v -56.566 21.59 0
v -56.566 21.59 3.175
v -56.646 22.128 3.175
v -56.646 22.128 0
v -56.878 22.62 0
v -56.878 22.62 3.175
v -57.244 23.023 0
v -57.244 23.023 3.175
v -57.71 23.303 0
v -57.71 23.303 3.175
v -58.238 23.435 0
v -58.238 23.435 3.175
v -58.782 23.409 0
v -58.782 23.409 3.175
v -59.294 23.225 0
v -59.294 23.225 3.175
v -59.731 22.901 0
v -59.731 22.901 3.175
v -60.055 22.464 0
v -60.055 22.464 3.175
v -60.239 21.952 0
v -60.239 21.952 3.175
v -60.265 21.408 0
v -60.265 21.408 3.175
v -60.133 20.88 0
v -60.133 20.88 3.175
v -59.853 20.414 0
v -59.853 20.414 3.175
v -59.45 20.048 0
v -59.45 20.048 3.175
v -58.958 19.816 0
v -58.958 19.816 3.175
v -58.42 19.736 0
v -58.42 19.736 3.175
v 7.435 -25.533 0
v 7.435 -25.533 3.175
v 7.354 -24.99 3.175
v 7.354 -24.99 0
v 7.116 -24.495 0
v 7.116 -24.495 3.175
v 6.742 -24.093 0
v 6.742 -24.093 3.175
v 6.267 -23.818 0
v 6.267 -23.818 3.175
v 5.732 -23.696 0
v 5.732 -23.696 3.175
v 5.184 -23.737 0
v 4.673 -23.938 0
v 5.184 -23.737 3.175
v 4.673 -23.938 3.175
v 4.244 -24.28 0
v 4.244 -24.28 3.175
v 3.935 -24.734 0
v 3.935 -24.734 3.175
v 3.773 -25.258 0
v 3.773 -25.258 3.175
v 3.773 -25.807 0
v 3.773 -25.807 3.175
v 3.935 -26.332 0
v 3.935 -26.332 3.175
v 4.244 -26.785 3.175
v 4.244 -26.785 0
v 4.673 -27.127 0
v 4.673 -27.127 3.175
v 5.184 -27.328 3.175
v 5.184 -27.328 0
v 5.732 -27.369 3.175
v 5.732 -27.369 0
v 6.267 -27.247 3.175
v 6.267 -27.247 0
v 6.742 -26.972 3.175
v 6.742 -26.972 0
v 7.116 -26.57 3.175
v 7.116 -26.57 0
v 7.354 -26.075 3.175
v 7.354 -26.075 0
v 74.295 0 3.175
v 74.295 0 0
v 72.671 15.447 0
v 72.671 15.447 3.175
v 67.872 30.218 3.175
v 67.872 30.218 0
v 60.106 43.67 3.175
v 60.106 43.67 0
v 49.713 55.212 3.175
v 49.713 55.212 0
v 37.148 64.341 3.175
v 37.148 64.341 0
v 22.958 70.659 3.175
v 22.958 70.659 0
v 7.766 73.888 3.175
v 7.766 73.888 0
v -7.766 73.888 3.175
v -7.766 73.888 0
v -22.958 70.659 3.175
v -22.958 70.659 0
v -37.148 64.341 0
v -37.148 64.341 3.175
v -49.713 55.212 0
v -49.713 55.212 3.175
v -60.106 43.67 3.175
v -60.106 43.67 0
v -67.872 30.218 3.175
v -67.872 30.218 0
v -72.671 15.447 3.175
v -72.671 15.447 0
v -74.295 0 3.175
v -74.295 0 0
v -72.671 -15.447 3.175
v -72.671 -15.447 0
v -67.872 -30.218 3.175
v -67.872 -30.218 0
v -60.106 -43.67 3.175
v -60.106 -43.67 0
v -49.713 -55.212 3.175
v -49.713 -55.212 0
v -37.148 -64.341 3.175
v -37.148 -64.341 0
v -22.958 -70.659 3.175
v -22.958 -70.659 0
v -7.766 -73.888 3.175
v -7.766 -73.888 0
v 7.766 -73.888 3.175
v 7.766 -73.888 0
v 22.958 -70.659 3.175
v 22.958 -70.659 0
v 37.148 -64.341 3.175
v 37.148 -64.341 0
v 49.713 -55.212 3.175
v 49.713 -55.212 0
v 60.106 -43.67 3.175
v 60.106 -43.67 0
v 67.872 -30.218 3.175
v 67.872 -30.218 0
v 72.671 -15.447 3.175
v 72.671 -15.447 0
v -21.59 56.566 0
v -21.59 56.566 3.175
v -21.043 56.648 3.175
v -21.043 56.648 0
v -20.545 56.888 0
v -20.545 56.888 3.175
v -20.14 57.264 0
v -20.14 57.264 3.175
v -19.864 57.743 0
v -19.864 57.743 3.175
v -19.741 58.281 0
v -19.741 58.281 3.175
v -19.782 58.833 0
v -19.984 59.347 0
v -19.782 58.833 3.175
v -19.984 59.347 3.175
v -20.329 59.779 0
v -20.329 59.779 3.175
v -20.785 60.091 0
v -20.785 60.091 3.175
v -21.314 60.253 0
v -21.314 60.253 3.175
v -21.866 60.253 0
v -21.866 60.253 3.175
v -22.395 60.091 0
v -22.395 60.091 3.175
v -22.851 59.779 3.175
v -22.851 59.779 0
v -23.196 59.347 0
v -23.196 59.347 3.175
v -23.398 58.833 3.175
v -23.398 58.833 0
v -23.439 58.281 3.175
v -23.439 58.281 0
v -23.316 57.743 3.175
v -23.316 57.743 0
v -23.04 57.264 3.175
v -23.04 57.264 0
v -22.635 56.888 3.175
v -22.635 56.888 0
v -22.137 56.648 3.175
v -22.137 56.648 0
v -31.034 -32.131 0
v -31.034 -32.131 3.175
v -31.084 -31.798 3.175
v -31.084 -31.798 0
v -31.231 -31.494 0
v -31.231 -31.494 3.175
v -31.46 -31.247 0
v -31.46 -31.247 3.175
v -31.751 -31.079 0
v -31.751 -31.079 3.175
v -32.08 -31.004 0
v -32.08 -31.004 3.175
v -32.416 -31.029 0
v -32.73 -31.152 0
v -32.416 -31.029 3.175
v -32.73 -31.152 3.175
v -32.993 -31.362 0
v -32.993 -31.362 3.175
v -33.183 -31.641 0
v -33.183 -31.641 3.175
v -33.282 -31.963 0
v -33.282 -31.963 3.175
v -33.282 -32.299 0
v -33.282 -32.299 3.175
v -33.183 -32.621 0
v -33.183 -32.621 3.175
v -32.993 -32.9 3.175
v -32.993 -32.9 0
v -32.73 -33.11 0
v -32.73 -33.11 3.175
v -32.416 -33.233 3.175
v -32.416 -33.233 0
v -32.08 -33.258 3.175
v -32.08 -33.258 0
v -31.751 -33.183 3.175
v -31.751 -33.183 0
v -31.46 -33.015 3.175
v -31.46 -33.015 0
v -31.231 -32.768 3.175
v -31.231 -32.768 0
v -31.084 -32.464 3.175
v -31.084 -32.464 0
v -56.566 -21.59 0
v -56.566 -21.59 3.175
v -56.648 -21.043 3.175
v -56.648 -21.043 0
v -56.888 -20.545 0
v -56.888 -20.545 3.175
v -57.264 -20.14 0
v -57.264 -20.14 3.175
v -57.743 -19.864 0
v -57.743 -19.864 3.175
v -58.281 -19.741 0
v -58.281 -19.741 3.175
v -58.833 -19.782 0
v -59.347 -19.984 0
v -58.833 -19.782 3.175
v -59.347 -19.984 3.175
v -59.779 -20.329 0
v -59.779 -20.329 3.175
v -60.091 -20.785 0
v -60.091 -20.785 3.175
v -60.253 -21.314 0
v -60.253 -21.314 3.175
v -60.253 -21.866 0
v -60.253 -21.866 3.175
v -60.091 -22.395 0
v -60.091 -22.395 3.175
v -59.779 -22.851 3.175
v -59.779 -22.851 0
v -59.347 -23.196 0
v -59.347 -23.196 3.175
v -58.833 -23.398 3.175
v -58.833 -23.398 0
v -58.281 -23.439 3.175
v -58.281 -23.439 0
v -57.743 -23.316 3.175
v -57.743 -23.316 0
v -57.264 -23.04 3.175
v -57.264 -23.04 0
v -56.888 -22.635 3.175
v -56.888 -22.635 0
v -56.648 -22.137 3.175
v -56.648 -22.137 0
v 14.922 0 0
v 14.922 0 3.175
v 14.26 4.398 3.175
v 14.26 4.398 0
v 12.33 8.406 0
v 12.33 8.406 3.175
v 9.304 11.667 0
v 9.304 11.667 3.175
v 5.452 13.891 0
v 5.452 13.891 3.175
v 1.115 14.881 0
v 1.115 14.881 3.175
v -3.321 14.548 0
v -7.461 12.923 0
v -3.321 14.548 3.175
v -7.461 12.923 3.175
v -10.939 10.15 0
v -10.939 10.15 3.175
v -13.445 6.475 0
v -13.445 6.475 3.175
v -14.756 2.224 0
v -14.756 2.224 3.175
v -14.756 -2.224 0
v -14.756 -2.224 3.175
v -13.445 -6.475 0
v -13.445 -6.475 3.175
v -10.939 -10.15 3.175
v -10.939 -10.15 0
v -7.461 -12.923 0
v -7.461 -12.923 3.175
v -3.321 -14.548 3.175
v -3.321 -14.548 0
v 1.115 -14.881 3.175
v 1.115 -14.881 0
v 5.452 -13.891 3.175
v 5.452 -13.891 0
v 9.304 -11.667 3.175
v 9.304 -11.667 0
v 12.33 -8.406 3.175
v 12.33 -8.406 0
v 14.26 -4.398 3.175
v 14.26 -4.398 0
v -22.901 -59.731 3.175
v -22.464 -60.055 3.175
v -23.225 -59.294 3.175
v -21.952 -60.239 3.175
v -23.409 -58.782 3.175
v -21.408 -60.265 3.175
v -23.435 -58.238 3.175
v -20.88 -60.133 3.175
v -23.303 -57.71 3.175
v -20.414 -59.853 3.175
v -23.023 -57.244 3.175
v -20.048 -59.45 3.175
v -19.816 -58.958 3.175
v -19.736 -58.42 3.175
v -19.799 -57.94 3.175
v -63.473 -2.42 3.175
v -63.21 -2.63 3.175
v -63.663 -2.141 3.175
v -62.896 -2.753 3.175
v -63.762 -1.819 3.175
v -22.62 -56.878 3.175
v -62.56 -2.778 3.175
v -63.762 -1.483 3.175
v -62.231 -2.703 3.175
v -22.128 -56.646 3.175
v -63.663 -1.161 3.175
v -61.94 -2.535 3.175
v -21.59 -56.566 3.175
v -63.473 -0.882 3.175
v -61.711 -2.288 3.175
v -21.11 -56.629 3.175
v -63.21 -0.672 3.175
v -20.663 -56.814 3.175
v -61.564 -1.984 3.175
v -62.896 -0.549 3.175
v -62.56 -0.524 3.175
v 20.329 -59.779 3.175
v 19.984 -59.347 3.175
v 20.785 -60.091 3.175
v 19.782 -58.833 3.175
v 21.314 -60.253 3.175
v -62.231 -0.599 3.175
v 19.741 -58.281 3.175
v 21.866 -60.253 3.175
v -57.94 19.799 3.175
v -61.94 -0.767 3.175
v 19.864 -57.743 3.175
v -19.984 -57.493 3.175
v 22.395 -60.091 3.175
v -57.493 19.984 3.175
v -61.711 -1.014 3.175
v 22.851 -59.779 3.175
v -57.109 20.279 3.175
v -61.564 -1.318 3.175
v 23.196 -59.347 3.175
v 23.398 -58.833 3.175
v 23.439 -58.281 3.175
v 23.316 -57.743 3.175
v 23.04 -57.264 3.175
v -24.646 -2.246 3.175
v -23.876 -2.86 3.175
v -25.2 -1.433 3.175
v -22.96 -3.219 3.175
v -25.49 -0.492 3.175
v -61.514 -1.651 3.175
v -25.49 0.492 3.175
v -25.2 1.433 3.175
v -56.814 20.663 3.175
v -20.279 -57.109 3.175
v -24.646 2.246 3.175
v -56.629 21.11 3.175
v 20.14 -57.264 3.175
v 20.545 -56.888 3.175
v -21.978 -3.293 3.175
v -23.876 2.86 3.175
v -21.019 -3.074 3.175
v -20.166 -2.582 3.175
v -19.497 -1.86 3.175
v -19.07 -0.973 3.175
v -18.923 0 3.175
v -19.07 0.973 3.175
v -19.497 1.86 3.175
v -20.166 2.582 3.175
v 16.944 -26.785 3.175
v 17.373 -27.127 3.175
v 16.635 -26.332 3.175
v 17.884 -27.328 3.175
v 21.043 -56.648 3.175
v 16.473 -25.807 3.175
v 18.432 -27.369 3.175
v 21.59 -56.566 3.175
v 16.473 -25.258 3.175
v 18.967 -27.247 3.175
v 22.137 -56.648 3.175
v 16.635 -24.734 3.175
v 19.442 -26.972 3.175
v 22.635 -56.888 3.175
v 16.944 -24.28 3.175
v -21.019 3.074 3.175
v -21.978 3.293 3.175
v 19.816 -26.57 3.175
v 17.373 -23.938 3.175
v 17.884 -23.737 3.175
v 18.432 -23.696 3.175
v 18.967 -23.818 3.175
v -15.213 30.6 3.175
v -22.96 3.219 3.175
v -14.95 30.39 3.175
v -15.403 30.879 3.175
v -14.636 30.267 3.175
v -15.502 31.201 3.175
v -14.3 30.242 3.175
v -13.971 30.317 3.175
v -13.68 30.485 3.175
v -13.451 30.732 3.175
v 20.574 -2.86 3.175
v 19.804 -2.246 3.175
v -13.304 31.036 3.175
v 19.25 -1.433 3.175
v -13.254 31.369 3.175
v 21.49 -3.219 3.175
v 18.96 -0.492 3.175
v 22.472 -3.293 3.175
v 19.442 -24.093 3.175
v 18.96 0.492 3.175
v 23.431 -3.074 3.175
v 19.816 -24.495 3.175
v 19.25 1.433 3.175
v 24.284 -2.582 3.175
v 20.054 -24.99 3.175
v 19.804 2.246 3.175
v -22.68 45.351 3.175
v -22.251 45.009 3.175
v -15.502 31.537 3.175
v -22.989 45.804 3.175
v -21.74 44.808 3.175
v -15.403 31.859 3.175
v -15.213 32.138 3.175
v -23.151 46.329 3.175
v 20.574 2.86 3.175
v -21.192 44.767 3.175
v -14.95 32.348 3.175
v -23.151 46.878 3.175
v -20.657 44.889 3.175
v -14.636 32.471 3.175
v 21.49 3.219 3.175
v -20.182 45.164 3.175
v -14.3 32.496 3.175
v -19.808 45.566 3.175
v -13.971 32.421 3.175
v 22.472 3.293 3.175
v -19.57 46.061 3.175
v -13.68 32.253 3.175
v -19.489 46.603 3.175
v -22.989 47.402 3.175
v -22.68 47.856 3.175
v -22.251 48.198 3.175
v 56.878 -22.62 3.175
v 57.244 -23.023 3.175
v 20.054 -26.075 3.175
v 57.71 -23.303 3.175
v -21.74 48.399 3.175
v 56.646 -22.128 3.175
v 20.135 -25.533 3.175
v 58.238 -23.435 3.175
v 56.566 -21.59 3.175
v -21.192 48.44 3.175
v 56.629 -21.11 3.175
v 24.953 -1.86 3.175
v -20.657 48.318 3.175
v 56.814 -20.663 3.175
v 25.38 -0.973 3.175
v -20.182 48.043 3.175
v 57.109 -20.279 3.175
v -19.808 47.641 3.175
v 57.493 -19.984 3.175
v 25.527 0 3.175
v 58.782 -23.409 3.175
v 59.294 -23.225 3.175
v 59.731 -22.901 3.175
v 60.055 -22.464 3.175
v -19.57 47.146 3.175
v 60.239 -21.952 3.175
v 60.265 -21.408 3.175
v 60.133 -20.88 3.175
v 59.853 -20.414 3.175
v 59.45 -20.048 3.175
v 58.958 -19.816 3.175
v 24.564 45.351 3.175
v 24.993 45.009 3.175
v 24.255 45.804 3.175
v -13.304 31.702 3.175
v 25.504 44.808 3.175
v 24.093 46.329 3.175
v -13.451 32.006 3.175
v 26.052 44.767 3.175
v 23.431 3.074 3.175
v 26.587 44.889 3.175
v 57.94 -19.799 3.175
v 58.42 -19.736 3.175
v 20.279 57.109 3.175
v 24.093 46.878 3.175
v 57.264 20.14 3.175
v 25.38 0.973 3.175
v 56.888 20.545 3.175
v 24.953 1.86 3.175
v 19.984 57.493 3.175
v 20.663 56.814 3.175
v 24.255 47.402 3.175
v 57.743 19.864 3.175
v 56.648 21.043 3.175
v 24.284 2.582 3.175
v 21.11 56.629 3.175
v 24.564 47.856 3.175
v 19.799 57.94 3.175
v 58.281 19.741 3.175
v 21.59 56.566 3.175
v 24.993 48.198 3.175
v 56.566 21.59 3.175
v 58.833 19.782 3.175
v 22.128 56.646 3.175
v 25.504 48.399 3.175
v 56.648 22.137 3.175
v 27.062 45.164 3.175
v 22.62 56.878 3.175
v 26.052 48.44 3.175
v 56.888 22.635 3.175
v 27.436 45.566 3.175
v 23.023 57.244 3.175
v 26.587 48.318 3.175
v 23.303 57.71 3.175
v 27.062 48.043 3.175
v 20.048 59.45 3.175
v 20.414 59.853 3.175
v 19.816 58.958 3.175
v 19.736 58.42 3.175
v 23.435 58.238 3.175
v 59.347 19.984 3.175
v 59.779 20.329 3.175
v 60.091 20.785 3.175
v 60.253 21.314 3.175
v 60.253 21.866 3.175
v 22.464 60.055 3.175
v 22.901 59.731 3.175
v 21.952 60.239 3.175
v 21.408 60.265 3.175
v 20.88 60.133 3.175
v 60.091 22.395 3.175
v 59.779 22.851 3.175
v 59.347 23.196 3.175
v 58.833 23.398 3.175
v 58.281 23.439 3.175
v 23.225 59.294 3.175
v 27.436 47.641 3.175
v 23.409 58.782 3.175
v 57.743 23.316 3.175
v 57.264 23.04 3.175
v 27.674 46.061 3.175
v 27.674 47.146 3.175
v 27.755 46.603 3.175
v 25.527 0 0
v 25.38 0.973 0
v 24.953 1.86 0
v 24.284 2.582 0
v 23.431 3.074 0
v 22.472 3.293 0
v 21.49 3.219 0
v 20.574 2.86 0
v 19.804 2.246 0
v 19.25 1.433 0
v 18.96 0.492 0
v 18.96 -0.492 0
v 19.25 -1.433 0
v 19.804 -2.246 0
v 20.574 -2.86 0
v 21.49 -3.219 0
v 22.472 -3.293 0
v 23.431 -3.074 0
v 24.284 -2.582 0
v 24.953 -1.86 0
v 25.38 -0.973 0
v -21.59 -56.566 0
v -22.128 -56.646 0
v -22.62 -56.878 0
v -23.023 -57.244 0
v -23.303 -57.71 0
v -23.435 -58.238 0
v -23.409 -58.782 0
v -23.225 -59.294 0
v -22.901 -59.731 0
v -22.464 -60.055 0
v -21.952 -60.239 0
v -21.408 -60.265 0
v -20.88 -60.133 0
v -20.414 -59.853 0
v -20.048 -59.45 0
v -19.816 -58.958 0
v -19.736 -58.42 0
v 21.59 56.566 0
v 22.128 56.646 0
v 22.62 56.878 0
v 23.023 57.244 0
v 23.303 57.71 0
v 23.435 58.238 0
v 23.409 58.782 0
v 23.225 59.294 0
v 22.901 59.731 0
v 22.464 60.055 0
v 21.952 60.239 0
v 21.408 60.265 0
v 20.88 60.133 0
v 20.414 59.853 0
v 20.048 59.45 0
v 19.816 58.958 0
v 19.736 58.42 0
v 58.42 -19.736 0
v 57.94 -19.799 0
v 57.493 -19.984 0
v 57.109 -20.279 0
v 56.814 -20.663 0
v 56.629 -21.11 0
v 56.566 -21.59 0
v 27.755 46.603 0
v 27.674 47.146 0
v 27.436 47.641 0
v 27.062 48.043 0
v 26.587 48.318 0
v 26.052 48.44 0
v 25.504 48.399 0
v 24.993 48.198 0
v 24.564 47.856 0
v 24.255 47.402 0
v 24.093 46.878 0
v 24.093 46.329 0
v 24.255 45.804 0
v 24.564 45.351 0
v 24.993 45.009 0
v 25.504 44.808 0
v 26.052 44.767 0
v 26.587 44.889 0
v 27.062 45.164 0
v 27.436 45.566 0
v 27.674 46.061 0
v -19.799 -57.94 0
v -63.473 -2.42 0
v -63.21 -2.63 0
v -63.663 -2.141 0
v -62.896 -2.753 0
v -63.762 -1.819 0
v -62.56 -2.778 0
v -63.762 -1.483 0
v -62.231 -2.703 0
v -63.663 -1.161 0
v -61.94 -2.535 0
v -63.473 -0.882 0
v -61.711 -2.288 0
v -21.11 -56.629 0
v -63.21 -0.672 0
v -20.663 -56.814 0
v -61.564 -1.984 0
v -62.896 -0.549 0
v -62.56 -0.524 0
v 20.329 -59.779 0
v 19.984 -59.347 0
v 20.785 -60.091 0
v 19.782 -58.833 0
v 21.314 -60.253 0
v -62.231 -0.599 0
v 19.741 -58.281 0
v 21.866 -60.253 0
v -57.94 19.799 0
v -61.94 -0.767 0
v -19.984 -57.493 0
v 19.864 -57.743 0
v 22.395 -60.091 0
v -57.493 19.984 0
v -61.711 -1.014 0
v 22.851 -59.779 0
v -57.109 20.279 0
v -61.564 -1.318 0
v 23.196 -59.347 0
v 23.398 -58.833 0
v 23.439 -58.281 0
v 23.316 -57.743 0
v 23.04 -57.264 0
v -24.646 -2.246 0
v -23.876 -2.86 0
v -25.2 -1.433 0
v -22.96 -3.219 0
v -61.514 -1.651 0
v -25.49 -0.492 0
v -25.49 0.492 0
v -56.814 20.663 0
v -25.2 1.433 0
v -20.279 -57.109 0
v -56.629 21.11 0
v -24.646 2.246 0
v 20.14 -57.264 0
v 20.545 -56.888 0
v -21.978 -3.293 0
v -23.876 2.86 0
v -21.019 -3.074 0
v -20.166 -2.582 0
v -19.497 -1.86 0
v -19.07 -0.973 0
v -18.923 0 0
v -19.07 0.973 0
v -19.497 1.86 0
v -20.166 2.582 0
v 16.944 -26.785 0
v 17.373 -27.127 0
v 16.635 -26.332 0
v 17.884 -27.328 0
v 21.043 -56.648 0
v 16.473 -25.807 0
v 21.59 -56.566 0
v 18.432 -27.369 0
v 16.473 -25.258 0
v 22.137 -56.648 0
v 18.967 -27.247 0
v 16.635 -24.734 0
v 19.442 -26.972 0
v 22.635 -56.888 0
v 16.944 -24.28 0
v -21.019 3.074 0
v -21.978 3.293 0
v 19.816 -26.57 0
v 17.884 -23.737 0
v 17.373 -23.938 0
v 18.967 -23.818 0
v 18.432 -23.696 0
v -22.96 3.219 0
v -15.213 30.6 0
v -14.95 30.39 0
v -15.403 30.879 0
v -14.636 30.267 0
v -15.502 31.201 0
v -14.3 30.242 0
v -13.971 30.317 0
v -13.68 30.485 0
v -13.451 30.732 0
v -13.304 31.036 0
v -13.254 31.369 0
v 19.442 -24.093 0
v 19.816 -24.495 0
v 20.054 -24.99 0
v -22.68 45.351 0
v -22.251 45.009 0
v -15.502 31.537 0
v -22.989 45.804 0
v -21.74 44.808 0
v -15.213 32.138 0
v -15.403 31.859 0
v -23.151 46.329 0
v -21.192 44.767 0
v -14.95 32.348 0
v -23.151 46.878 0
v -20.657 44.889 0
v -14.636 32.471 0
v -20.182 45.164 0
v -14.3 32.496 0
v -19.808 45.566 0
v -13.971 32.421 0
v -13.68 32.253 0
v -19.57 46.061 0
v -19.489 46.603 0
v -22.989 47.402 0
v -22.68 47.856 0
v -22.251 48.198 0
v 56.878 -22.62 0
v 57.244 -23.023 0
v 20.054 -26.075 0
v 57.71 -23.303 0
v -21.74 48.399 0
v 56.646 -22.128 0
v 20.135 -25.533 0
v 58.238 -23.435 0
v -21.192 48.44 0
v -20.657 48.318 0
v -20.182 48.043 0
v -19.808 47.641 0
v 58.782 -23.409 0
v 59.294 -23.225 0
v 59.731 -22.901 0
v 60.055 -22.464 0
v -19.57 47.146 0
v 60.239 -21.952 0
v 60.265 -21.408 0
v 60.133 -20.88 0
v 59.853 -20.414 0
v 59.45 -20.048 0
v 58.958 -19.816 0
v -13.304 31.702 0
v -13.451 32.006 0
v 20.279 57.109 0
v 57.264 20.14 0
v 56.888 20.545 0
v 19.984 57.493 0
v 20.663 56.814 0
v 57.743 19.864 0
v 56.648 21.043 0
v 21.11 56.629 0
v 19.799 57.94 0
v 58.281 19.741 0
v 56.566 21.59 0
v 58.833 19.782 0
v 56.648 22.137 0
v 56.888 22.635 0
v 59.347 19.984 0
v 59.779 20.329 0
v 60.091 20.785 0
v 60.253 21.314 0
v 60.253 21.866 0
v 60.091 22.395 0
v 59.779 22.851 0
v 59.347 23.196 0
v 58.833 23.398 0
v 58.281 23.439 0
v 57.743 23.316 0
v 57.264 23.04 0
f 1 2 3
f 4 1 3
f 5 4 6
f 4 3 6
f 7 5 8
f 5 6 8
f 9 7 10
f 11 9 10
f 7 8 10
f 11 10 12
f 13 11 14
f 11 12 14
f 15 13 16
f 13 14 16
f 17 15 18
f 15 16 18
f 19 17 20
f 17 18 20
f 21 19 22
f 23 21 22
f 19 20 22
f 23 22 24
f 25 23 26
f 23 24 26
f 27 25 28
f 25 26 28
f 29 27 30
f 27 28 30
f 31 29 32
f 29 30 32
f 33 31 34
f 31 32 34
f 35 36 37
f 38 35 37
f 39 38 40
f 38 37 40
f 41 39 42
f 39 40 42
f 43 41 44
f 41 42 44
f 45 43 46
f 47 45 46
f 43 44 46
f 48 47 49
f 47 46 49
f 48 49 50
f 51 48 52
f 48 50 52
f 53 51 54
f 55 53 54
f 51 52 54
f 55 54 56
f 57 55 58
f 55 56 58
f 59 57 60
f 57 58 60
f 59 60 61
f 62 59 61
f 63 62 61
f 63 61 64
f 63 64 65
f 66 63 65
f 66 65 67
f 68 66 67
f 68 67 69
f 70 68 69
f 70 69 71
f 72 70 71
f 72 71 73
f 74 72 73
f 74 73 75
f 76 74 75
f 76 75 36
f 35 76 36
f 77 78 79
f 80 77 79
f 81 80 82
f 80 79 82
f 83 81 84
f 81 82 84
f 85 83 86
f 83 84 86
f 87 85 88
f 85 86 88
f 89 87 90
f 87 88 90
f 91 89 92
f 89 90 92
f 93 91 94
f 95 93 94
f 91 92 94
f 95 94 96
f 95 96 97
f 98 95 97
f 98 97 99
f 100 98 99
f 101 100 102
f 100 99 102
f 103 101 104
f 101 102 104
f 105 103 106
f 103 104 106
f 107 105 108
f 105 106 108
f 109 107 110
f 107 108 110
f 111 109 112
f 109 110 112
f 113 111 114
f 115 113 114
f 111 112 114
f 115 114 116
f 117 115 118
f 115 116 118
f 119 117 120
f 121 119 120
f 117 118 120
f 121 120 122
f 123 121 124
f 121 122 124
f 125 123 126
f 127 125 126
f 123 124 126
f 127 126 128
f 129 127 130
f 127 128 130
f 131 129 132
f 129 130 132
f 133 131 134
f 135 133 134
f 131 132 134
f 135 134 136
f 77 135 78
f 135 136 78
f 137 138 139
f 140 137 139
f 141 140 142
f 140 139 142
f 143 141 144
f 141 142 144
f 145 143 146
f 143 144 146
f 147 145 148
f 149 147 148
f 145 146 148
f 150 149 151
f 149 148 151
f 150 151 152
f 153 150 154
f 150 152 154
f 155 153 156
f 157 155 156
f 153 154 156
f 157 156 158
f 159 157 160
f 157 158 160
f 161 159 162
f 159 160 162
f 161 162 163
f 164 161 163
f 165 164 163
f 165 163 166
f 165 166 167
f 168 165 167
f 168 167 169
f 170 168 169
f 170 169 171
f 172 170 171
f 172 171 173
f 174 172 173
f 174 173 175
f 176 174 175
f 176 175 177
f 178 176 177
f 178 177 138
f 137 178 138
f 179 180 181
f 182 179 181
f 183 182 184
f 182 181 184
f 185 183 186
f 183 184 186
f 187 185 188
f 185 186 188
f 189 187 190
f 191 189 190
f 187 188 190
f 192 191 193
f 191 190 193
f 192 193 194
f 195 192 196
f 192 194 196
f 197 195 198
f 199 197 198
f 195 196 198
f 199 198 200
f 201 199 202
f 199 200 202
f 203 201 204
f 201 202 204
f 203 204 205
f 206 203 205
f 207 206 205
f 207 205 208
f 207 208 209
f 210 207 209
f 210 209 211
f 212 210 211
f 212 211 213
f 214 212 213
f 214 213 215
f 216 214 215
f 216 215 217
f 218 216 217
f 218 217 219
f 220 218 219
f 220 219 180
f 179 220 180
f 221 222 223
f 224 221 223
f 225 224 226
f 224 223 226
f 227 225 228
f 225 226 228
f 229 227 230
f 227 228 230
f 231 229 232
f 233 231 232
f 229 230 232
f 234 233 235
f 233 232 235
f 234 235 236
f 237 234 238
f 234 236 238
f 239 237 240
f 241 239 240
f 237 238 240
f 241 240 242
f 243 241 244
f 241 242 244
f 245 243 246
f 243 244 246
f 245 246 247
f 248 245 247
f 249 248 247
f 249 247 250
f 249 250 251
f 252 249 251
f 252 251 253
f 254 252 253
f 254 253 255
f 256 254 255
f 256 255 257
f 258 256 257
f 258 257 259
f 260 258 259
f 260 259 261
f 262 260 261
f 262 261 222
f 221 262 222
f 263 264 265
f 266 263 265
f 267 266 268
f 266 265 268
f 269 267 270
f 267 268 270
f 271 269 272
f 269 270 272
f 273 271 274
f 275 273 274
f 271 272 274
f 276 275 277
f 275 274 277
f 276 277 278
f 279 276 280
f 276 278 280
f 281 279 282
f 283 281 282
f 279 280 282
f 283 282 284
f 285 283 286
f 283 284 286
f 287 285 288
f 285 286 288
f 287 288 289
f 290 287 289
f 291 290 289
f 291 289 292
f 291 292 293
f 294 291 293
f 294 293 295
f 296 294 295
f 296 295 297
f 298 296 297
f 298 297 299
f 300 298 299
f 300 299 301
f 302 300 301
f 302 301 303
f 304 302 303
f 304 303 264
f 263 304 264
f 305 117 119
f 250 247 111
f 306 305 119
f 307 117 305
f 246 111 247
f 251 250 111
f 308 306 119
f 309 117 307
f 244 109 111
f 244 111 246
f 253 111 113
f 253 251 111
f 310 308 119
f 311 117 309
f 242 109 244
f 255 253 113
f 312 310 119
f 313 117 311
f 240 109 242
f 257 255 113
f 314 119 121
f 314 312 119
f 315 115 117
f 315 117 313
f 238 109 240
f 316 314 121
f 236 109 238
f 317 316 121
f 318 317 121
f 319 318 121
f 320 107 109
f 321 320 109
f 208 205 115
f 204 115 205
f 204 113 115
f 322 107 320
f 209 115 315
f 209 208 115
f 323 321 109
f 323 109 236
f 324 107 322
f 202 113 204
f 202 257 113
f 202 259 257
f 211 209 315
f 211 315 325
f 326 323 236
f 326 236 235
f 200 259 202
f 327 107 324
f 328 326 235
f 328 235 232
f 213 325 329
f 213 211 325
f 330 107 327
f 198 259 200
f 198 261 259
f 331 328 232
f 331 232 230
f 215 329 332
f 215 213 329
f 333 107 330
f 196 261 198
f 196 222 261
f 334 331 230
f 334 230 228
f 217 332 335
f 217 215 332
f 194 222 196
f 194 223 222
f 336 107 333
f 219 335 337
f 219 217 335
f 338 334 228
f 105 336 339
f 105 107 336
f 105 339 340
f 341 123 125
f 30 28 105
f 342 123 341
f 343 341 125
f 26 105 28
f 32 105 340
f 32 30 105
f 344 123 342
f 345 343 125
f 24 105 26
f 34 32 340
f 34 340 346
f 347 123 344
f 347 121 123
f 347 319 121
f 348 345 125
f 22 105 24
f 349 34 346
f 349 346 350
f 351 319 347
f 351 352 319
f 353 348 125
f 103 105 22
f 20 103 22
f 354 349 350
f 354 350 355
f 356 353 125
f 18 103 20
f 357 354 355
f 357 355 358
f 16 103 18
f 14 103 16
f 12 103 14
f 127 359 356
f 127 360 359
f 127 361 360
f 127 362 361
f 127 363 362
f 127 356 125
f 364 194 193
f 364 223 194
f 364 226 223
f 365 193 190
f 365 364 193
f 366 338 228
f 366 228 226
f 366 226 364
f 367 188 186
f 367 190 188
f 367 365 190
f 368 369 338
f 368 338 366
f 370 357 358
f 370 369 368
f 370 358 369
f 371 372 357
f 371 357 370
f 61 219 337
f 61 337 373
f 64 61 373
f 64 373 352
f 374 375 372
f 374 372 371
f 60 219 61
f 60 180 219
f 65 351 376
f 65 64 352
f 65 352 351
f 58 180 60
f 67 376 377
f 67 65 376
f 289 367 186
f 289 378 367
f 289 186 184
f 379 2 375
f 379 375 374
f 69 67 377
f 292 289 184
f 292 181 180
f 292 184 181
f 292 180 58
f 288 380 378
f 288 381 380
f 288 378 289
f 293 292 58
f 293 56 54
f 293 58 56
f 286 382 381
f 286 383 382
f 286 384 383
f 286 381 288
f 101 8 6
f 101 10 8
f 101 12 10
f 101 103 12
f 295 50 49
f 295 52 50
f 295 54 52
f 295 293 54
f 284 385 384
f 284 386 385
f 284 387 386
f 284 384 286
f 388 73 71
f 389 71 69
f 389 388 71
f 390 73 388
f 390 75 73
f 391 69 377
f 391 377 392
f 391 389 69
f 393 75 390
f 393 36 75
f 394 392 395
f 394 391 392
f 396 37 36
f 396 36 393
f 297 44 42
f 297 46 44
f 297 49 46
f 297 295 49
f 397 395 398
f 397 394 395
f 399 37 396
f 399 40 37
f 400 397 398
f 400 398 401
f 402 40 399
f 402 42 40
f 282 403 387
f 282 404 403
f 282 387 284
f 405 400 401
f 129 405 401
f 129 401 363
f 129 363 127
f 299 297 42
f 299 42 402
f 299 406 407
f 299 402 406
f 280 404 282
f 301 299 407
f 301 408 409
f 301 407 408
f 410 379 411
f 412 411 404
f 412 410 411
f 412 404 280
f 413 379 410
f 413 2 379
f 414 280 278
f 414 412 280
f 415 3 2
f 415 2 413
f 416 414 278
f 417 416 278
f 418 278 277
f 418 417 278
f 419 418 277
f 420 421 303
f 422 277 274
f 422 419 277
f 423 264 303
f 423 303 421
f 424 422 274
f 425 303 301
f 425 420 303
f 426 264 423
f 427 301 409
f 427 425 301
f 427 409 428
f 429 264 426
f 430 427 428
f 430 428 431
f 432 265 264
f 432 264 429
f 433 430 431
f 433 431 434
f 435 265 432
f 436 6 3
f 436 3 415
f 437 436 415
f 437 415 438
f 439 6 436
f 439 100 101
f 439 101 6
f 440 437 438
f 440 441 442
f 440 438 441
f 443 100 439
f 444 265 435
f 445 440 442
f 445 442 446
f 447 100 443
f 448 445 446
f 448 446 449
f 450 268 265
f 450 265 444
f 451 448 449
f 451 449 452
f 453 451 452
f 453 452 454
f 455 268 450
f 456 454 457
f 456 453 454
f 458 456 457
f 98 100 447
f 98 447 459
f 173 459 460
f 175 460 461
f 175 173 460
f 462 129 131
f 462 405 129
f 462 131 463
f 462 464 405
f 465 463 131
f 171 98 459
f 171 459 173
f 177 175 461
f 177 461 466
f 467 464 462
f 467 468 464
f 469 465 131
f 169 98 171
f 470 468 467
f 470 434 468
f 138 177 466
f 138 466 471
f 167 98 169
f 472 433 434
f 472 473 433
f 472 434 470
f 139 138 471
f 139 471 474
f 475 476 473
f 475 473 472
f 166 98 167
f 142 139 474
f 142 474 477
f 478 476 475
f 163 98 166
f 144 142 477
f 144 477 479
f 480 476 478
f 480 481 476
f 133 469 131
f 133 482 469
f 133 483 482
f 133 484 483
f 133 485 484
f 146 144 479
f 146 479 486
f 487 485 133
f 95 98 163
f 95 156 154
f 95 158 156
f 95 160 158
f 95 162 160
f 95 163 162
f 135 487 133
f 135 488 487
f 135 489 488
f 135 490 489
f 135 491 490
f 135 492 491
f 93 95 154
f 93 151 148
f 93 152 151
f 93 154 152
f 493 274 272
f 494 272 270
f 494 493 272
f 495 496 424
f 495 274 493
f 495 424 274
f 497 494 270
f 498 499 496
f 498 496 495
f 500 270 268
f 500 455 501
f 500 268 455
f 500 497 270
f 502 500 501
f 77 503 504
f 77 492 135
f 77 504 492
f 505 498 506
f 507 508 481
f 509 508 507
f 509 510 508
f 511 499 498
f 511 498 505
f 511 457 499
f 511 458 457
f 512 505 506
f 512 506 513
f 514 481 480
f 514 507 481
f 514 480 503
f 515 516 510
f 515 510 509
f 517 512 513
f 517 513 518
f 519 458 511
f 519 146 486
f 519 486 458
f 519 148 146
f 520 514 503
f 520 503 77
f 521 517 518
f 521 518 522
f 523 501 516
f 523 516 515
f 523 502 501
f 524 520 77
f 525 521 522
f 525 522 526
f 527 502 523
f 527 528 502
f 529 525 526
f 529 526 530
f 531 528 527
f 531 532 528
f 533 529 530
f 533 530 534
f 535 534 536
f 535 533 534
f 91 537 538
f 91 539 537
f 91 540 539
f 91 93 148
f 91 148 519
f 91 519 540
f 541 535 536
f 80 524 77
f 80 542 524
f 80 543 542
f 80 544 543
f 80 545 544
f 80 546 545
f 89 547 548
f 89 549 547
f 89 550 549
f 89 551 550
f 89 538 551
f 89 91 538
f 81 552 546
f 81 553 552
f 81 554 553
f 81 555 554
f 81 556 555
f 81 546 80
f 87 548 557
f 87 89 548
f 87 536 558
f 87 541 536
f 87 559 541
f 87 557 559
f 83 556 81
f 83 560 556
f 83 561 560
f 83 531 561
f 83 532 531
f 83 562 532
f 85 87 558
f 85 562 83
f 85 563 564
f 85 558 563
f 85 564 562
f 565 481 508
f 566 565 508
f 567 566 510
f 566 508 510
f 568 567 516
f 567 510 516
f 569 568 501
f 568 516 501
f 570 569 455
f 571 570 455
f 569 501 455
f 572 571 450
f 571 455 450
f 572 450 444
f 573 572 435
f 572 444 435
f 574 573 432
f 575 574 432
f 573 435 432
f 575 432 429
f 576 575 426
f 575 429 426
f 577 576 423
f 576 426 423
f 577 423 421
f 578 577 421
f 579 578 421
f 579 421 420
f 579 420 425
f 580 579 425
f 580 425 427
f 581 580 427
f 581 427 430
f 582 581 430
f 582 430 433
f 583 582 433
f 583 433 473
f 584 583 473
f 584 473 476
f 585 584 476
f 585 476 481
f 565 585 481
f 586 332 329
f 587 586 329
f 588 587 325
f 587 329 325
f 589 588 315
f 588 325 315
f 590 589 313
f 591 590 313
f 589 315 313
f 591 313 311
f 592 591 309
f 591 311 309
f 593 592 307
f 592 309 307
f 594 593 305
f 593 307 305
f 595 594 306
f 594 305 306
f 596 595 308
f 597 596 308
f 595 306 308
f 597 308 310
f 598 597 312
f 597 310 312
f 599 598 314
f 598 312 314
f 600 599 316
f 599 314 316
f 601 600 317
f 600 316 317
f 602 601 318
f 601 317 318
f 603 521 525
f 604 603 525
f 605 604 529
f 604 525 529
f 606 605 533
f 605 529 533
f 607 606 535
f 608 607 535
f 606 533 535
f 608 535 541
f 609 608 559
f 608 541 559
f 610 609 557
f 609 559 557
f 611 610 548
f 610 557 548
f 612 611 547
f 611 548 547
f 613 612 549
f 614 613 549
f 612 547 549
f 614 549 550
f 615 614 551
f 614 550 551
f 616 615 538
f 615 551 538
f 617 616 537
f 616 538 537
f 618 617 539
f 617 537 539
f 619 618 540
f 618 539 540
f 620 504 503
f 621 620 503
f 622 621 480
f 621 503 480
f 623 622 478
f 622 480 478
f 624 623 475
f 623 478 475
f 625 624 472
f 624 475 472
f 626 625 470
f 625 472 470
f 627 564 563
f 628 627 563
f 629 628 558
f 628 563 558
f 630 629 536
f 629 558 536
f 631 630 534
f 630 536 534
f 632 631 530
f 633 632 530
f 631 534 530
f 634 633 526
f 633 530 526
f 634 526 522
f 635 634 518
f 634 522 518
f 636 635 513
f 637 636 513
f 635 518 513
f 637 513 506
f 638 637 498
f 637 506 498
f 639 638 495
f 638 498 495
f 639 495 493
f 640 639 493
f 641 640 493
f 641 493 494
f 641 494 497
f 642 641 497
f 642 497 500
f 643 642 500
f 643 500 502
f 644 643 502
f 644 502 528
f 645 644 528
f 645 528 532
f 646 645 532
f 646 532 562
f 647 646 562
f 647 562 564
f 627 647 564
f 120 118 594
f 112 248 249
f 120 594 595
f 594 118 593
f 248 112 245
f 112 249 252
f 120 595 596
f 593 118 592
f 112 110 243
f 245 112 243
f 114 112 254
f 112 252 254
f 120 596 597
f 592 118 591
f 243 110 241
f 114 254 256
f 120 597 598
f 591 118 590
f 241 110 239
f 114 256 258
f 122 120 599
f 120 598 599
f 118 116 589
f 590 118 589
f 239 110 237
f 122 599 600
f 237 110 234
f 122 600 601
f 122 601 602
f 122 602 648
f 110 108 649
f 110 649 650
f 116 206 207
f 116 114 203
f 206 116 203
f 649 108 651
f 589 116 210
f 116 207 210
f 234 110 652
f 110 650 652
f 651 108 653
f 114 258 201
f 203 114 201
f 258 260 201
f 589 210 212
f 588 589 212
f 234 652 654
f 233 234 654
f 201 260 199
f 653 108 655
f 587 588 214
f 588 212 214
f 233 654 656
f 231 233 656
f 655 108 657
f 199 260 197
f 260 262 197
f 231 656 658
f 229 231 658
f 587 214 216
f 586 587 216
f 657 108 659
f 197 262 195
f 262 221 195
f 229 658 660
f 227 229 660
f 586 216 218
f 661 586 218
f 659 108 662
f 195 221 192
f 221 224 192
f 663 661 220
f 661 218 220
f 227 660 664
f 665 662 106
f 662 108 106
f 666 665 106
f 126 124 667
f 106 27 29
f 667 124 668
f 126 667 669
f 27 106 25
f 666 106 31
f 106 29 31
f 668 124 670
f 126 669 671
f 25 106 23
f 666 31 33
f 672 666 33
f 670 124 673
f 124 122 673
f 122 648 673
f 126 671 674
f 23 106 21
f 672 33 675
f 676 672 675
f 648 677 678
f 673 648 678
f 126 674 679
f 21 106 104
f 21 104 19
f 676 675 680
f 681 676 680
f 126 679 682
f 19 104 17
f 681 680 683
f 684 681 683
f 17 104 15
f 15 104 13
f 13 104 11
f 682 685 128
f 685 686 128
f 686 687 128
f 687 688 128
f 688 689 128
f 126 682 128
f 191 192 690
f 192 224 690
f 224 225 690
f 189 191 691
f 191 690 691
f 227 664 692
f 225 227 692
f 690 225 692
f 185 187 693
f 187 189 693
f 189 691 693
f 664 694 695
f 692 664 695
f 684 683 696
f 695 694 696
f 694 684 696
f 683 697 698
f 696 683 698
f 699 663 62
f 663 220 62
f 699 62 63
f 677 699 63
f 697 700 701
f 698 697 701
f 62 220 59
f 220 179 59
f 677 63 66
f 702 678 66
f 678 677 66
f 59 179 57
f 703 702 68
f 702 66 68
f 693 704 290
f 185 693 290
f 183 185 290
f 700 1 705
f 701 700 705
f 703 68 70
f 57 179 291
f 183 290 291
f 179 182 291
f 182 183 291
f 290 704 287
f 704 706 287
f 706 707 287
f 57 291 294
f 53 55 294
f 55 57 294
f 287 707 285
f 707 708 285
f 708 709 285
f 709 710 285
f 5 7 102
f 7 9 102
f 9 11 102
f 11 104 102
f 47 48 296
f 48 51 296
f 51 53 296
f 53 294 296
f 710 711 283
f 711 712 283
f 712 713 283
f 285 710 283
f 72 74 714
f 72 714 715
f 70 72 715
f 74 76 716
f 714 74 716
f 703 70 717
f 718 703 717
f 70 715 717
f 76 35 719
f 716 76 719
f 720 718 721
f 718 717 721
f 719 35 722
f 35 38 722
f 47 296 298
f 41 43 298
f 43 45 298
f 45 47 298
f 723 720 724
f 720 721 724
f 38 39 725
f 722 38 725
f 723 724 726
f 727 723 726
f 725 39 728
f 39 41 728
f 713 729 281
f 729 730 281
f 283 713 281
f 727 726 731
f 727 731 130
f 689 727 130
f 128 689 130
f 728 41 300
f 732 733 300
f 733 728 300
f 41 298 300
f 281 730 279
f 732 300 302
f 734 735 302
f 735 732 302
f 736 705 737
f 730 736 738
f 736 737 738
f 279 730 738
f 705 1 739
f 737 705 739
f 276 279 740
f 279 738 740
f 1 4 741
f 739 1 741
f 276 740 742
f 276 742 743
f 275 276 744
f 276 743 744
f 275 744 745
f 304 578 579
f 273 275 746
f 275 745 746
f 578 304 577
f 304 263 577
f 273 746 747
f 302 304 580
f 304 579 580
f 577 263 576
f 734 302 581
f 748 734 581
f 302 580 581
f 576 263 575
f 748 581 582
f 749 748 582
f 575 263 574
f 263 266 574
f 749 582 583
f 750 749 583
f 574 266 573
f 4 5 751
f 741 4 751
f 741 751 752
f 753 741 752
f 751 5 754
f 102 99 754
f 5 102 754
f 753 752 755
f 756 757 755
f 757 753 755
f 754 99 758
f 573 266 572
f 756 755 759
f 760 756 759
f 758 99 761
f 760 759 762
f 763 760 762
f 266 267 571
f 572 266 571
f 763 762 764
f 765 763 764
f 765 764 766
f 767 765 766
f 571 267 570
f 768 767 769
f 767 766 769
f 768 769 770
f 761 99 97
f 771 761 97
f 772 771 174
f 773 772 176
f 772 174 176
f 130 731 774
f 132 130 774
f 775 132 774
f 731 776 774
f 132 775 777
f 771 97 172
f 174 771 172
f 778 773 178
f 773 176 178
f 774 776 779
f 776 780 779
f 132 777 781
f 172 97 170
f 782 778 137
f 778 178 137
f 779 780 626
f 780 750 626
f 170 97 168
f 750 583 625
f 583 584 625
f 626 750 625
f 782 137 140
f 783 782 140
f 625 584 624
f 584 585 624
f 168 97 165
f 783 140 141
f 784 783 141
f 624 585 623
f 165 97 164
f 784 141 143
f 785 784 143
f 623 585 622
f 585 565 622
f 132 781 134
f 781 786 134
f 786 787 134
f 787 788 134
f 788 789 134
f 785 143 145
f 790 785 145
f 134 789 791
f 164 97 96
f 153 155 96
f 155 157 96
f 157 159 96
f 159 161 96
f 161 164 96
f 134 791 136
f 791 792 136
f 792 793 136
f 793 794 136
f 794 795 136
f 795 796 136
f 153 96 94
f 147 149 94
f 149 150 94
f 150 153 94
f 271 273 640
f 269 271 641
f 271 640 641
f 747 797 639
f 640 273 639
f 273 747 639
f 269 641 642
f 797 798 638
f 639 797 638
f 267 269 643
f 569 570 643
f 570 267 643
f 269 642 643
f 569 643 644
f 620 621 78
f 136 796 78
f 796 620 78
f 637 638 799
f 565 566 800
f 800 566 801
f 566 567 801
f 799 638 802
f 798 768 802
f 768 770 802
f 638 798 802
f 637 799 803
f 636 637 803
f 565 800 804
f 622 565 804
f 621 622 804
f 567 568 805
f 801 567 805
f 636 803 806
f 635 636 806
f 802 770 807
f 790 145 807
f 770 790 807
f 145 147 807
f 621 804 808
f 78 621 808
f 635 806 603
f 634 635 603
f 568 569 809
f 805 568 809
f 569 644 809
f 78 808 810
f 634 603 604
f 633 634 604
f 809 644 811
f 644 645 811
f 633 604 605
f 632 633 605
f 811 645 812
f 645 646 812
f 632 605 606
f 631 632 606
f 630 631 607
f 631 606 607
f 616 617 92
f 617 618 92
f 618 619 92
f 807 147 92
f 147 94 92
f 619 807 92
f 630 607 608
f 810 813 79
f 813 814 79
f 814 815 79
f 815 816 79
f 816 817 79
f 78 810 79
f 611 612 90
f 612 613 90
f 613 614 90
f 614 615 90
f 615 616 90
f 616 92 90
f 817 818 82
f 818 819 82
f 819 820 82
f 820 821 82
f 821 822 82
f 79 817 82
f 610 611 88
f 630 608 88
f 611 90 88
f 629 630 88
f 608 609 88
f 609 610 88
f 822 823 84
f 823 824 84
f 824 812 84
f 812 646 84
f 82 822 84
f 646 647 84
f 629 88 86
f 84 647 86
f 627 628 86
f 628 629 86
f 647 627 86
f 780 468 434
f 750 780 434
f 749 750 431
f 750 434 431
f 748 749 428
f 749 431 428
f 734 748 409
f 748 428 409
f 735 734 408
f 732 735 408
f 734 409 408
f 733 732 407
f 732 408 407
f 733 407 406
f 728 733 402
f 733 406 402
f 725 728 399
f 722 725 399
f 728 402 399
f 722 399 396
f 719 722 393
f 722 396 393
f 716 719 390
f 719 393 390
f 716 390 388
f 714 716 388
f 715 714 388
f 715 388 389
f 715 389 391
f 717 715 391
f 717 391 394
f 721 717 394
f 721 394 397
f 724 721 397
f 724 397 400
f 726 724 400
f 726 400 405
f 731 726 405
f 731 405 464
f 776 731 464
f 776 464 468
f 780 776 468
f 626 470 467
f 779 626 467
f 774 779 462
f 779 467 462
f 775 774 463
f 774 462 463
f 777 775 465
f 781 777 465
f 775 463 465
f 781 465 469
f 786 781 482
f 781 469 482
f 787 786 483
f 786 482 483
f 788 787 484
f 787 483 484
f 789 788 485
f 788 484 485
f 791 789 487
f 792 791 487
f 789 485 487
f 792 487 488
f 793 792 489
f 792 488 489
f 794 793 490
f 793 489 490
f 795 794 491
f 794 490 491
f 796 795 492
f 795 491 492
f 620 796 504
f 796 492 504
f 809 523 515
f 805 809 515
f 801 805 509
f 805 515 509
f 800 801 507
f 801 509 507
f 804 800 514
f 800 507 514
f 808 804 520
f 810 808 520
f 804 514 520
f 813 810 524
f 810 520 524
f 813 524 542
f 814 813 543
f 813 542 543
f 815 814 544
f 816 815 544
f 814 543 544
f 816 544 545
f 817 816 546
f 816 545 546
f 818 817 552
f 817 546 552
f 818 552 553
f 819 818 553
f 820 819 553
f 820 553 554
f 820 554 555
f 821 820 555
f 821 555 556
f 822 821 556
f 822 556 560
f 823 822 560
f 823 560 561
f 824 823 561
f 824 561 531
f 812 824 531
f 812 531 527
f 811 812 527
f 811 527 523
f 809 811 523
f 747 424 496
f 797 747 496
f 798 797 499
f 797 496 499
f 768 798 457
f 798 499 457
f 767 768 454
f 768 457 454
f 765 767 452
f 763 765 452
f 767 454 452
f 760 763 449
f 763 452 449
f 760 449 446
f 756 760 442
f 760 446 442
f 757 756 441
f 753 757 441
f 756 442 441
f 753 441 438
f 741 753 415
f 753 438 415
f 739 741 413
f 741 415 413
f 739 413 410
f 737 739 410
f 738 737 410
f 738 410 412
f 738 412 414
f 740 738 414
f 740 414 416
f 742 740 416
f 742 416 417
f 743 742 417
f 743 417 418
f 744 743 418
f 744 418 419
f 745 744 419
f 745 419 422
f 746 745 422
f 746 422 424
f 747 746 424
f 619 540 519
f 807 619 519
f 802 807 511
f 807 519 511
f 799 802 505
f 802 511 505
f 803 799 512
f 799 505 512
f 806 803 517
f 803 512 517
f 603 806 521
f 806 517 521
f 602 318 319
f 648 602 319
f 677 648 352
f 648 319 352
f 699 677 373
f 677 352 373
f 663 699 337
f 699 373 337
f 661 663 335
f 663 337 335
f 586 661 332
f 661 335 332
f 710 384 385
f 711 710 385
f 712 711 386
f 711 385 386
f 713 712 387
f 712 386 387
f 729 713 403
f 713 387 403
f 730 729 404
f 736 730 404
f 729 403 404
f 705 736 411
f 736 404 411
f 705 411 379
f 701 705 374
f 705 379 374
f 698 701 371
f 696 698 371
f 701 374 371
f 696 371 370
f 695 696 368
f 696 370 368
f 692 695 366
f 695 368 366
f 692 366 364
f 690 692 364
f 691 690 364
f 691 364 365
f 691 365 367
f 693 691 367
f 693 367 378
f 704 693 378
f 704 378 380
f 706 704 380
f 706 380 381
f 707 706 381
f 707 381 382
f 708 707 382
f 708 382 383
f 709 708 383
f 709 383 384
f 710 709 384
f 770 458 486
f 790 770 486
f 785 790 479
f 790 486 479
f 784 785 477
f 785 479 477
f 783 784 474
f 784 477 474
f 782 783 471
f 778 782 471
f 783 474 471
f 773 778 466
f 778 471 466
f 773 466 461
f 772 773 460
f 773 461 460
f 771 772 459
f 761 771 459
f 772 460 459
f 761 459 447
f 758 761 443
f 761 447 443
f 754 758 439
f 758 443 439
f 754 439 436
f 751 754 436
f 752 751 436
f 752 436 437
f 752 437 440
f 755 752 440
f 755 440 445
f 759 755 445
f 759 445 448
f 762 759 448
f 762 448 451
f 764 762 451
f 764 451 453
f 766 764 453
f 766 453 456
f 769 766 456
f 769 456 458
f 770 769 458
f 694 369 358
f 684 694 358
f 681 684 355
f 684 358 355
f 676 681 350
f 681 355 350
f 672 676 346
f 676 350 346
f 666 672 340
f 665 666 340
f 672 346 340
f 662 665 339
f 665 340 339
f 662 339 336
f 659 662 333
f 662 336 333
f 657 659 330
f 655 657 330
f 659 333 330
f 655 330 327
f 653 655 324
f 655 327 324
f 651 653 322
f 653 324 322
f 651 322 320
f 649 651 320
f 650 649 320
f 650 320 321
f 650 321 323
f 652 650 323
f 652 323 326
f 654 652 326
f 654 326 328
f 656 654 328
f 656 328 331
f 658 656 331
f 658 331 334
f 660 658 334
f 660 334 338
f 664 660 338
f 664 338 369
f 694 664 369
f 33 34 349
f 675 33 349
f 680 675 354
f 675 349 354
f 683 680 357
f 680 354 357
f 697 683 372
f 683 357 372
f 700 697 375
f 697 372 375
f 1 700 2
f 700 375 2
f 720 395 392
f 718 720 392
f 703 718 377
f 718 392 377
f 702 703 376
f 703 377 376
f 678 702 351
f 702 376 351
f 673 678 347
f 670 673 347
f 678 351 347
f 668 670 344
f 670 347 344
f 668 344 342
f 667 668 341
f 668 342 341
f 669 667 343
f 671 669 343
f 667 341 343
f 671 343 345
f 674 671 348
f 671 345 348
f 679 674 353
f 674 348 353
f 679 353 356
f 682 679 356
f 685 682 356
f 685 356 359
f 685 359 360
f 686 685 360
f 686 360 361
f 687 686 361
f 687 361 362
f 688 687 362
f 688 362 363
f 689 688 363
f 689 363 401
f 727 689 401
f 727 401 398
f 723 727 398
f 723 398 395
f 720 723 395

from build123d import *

# Parameters (mm, degrees)
F0_R            = 74.295
F1_DEPTH        = 3.175
F2_R            = 1.8542
F3_DEPTH        = 3.176
F3_COPIES_COUNT = 4
F4_R            = 14.9225
F4_R_2          = 3.302
F5_DEPTH        = 3.176
F6_R            = 1.8415
F7_DEPTH        = 3.176
F8_R            = 1.1303
F9_DEPTH        = 3.176


# Not quite as in the source:
# - a pattern or mirror of a feature is missing from the dataset's text; its kind, count and spacing are read off the source's solid


with BuildPart() as f1:
    # F0 (on Top) → F1 (new body)
    with BuildSketch(Plane.XY):
        Circle(F0_R)
    extrude(amount=F1_DEPTH)

    # F2 (on face) → F3 (cut, through all)
    with BuildSketch(Plane.XY.offset(3.175)):
        with BuildLine():
            ThreePointArc((-58.42, 19.7358), (-57.1088826063, 20.2788826063), (-56.5658, 21.59))
            ThreePointArc((-56.5658, 21.59), (-59.7311173937, 22.9011173937), (-58.42, 19.7358))
        make_face()
        with Locations((-58.42, -21.59)):
            Circle(F2_R)
    f3 = extrude(amount=-F3_DEPTH, mode=Mode.SUBTRACT)

    # F3_copies: F3 ×4 about axis
    f3_copies_axis = Axis((0, 0, 0), (0, 0, 1))
    for i in range(1, F3_COPIES_COUNT):
        add(f3.rotate(f3_copies_axis, i * 360 / F3_COPIES_COUNT), mode=Mode.SUBTRACT)

    # F4 (on face) → F5 (cut, through all)
    with BuildSketch(Plane.XY.offset(3.175)):
        Circle(F4_R)
        with Locations((-22.225, 0)):
            Circle(F4_R_2)
        with Locations((22.225, 0)):
            Circle(F4_R_2)
    extrude(amount=-F5_DEPTH, mode=Mode.SUBTRACT)

    # F6 (on face) → F7 (cut, through all)
    with BuildSketch(Plane.XY.offset(3.175)):
        with Locations((-21.330000012, 46.603412)):
            Circle(F6_R)
        with Locations((25.913999988, 46.603412)):
            Circle(F6_R)
        with Locations((5.593999988, -25.532588)):
            Circle(F6_R)
        with Locations((18.293999988, -25.532588)):
            Circle(F6_R)
    extrude(amount=-F7_DEPTH, mode=Mode.SUBTRACT)

    # F8 (on face) → F9 (cut, through all)
    with BuildSketch(Plane.XY.offset(3.175)):
        with Locations((-14.3844060319, 31.369)):
            Circle(F8_R)
        with Locations((-62.6444060319, -1.651)):
            Circle(F8_R)
        with Locations((-32.1644060319, -32.131)):
            Circle(F8_R)
    extrude(amount=-F9_DEPTH, mode=Mode.SUBTRACT)


solid = f1.part
